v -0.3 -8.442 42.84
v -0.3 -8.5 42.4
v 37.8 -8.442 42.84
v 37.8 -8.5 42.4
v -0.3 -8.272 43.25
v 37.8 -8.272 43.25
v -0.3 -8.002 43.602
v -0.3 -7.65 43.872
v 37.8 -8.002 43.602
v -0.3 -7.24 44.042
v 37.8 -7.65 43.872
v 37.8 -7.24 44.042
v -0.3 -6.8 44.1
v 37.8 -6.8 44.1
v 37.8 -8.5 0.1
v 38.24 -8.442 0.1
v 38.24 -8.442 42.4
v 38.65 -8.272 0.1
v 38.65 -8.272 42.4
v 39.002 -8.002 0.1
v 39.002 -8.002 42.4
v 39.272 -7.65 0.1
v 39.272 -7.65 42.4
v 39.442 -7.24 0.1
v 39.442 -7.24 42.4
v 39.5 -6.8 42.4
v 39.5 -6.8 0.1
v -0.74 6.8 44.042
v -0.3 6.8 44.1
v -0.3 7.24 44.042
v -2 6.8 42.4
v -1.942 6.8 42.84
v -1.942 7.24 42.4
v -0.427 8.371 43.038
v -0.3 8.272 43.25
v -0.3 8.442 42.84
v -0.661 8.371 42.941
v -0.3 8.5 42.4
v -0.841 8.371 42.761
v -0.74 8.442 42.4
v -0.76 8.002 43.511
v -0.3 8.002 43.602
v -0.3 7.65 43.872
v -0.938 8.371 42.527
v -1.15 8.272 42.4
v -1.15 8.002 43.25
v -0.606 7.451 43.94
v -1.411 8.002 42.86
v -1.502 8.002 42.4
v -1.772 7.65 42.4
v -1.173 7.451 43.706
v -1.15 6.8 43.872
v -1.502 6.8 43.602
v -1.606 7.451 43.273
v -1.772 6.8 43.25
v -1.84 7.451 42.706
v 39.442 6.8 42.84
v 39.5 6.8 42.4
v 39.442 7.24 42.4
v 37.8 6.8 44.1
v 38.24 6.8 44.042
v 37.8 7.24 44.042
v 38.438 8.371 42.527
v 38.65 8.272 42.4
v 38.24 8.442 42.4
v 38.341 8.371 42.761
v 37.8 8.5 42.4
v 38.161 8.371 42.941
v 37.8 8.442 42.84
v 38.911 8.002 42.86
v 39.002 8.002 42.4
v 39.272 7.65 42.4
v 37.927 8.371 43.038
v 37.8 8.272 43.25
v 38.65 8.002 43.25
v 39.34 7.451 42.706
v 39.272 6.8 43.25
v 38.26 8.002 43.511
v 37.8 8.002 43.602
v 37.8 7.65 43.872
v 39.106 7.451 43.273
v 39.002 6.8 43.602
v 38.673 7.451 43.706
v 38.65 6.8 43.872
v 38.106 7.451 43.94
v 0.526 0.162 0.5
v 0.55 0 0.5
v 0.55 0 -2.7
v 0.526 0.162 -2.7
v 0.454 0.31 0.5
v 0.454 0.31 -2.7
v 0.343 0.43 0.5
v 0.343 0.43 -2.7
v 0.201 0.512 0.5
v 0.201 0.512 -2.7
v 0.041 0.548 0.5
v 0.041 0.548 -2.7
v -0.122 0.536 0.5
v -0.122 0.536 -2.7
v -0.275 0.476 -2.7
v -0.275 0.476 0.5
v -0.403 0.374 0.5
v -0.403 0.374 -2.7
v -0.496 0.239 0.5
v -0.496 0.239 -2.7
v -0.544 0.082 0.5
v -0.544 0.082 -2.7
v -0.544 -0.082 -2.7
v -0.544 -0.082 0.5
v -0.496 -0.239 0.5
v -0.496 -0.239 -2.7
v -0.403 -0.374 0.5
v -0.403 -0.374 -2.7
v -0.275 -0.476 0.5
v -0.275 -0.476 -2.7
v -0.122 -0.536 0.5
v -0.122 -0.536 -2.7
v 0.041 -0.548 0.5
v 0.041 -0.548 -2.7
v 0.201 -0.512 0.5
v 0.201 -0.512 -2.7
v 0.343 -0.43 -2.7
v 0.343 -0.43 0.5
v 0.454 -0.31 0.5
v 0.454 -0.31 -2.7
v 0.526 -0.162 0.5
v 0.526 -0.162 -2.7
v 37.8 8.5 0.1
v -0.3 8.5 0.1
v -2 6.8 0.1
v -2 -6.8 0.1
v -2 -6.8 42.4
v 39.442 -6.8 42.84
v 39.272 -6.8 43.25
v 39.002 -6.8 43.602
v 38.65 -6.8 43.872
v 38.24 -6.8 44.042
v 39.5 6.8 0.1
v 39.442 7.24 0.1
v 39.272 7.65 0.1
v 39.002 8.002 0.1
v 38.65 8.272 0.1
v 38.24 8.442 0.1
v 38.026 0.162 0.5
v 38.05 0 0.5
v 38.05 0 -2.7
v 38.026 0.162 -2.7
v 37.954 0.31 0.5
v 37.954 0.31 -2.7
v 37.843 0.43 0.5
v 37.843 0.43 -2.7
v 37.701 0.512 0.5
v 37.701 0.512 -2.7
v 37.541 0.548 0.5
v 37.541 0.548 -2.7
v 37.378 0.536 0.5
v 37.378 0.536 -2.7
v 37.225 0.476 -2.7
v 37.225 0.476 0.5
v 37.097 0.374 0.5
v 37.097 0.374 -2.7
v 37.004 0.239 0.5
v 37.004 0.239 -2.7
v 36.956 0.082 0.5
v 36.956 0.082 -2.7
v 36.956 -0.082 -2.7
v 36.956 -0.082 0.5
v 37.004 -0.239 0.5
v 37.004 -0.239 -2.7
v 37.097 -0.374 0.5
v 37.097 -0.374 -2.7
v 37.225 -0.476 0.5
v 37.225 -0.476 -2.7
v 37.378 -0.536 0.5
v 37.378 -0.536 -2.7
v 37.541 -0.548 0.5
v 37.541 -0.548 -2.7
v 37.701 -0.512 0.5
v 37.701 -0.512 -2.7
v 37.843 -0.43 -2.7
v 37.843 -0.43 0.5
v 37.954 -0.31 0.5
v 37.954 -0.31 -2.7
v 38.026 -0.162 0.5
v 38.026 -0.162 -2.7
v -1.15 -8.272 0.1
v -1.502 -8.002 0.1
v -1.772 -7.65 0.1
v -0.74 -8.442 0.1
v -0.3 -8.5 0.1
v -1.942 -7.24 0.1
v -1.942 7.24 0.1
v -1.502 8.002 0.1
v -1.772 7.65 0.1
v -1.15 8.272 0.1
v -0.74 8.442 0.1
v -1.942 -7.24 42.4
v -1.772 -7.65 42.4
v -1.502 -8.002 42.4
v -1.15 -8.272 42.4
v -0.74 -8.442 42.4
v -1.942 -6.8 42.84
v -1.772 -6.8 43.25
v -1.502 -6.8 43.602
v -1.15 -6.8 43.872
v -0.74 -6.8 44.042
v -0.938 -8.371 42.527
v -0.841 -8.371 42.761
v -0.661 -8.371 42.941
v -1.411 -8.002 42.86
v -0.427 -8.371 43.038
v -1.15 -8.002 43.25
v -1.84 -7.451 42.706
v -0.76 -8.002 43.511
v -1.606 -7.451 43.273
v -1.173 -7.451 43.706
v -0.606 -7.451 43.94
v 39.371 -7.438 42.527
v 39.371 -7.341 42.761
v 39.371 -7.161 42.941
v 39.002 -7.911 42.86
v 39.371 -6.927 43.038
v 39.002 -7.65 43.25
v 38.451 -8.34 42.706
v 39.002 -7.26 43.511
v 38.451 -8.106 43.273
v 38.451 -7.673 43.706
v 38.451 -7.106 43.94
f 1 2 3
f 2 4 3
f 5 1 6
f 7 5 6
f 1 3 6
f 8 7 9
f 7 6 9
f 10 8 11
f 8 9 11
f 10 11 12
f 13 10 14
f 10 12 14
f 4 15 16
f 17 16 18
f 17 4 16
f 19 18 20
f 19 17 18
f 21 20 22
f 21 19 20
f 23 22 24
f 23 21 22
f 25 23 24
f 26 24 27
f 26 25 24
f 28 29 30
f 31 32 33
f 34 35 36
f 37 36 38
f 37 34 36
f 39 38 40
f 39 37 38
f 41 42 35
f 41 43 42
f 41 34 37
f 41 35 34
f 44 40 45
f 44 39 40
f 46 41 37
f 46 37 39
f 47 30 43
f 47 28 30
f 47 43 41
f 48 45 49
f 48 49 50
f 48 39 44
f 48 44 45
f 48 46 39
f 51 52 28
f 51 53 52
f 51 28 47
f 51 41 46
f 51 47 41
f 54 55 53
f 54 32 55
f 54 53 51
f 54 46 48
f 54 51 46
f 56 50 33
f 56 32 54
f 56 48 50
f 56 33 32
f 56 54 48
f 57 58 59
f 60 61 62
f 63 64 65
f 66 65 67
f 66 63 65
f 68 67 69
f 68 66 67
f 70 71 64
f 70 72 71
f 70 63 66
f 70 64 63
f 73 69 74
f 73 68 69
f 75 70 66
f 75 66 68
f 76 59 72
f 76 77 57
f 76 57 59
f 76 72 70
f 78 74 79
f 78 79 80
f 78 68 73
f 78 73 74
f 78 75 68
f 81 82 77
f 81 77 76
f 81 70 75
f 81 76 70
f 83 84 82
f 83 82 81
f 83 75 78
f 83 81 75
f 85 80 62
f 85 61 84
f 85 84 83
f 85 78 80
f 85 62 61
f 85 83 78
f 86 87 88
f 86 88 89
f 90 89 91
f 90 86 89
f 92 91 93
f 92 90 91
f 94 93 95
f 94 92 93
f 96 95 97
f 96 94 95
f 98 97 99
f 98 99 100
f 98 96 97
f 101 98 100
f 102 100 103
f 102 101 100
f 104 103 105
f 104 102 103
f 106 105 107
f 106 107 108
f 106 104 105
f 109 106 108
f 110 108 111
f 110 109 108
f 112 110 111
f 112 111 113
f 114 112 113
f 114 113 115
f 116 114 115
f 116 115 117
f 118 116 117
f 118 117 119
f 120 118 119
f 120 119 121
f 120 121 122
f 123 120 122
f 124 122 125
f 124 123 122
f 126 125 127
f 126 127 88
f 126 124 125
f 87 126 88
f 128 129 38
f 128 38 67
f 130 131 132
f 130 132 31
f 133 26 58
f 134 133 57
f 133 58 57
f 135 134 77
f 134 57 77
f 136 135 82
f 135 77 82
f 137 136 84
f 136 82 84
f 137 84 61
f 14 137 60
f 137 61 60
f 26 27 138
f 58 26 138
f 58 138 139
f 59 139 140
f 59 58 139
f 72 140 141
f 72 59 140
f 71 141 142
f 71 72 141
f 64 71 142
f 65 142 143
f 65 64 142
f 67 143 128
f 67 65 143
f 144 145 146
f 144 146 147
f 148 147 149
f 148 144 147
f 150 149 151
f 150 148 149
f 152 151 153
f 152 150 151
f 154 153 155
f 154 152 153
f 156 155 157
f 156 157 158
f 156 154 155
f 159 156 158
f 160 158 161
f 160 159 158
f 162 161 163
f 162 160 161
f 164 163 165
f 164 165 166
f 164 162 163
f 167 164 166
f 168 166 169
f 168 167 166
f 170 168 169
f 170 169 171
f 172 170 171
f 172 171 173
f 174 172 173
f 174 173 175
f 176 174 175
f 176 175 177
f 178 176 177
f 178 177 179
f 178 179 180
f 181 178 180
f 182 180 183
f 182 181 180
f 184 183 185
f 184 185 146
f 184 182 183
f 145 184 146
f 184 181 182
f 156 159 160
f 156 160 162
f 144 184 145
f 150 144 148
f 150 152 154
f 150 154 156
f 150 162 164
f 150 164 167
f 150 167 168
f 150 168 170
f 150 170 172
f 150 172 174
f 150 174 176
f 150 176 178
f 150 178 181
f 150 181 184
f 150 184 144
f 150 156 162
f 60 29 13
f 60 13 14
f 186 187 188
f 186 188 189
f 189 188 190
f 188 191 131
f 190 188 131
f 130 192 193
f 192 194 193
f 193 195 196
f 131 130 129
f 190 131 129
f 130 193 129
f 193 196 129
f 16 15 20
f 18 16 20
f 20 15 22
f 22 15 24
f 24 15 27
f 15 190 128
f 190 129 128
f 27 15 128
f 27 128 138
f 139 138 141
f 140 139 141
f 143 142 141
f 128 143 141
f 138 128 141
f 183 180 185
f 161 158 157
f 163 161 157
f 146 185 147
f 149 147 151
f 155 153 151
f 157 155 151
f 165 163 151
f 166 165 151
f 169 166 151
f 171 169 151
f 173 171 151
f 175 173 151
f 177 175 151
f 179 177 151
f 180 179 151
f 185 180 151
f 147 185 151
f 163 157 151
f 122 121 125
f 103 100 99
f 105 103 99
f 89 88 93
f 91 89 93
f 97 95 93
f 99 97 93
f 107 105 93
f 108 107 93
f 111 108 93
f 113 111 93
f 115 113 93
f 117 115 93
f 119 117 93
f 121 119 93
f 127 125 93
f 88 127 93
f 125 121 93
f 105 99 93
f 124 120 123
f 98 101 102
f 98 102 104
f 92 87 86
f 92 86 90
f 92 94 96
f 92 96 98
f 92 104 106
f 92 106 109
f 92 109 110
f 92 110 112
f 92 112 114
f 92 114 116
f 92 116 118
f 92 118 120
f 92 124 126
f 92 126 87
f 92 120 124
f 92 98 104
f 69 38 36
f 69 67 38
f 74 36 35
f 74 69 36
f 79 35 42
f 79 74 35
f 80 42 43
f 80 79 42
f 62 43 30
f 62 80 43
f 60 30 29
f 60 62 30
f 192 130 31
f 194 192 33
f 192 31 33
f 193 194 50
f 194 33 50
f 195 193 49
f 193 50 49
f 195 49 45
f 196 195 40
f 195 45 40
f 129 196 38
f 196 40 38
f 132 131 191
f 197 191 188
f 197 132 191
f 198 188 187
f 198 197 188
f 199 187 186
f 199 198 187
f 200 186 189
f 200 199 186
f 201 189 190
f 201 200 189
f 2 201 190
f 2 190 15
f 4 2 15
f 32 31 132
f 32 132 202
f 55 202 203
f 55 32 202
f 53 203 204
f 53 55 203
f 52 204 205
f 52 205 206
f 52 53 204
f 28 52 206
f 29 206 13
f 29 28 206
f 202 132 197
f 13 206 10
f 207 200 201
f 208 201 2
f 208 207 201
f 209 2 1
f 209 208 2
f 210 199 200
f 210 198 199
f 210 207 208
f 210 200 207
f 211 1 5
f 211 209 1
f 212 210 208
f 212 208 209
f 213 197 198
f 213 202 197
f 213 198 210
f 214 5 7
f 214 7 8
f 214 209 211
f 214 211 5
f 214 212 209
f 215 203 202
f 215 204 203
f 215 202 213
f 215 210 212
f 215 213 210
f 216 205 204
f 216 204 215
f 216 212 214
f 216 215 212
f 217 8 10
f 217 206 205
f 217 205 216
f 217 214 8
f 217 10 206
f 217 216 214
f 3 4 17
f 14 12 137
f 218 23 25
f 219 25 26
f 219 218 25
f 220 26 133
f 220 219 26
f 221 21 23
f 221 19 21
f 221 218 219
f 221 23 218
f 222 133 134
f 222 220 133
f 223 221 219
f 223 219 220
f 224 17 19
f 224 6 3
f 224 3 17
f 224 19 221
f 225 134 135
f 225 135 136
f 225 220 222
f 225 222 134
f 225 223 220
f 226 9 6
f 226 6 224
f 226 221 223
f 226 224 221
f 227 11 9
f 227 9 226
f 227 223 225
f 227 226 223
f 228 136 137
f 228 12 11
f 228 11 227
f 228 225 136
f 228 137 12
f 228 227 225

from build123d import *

# Parameters (mm, degrees)
SKETCH_W     = 41.5
SKETCH_H     = 17
PAD_DEPTH    = 44
FILLET_R     = 1.7
SKETCH001_R  = 0.55
PAD001_DEPTH = 3.2


with BuildPart() as fillet_body:
    # Sketch → Pad (new body)
    with BuildSketch(Plane.XY.offset(0.1)):
        with Locations((18.75, 0)):
            Rectangle(SKETCH_W, SKETCH_H)
    extrude(amount=PAD_DEPTH)

    # Fillet
    fillet_edges = [fillet_body.edges().sort_by_distance(p)[0] for p in [
        (-2, 0, 44.1),
        (-2, -8.5, 22.1),
        (18.75, -8.5, 44.1),
        (39.5, -8.5, 22.1),
        (39.5, 0, 44.1),
        (39.5, 8.5, 22.1),
        (18.75, 8.5, 44.1),
        (-2, 8.5, 22.1),
    ]]
    fillet(fillet_edges, radius=FILLET_R)


with BuildPart() as pad001:
    # Sketch001 → Pad001 (new body)
    with BuildSketch(Plane.XY.offset(0.5)):
        Circle(SKETCH001_R)
        with Locations((37.5, 0)):
            Circle(SKETCH001_R)
    extrude(amount=-PAD001_DEPTH)


solid = Compound([fillet_body.part, pad001.part])
